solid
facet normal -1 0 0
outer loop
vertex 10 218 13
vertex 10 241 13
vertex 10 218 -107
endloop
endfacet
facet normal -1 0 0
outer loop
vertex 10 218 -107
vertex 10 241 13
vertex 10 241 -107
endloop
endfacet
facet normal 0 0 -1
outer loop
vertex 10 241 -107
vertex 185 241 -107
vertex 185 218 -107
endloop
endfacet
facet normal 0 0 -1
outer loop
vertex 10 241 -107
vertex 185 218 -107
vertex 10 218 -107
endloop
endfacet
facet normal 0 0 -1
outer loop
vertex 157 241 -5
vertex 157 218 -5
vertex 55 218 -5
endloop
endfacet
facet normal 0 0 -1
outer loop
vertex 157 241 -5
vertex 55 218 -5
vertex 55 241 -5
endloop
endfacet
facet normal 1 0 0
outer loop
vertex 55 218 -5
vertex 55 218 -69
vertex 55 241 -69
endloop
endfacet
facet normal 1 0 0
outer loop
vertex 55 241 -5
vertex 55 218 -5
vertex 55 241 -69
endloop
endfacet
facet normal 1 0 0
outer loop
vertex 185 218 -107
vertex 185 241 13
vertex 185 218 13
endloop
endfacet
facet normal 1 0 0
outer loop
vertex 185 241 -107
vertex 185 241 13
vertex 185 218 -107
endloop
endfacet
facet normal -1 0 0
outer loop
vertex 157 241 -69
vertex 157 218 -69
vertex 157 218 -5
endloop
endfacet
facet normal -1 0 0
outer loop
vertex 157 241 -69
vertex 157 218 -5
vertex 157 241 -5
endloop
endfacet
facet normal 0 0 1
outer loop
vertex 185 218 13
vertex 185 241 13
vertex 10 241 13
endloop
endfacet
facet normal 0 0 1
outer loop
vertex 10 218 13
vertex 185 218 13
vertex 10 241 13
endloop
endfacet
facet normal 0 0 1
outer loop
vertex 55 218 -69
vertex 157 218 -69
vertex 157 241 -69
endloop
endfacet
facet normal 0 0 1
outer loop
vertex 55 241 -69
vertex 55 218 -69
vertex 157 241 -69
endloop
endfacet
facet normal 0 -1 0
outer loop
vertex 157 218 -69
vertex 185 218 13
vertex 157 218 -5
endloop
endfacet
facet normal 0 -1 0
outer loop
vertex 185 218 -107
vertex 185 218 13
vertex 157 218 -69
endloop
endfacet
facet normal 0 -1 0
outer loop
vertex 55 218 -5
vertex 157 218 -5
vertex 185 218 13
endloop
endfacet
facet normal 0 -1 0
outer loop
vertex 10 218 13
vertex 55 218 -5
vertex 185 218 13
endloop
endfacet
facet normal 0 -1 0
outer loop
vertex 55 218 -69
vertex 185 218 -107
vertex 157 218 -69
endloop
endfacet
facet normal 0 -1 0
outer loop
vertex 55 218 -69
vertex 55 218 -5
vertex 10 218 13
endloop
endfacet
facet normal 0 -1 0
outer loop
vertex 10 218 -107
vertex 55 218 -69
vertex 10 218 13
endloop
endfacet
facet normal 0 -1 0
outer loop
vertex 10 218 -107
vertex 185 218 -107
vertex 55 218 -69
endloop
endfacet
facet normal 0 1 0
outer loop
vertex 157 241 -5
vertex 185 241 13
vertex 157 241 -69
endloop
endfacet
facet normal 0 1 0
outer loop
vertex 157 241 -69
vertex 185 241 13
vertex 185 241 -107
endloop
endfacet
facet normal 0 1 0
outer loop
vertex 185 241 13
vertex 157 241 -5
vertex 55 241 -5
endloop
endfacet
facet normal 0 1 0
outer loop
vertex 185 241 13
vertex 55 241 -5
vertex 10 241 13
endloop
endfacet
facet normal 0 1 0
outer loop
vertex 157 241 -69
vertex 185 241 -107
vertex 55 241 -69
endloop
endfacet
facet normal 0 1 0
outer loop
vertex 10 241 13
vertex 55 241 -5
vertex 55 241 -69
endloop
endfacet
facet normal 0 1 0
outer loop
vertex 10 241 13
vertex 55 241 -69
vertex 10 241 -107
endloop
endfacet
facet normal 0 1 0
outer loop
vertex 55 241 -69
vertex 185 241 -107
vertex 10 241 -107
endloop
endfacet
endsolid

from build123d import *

# Parameters (mm, degrees)
BOX043_W               = 30
BOX043_H               = 64
BOX043_DEPTH           = 102
BOX042_W               = 175
BOX042_H               = 120
BOX042_DEPTH           = 23
CUT013_ROLL_ANGLE      = -90
CUT013_PLACEMENT_ANGLE = -180


with BuildPart() as cube038:
    # Box043 → Box043 (new body)
    with BuildSketch(Plane(origin=(28, 18, 27), x_dir=(0, 0, -1), z_dir=(1, 0, 0))):
        with Locations((15, 32)):
            Rectangle(BOX043_W, BOX043_H)
    extrude(amount=BOX043_DEPTH)


with BuildPart() as graflok_spacer:
    # Box042 → Box042 (new body)
    with BuildSketch(Plane.XY):
        with Locations((87.5, 60)):
            Rectangle(BOX042_W, BOX042_H)
    extrude(amount=BOX042_DEPTH)

    # Cut013: cut Cube038
    add(cube038.part, mode=Mode.SUBTRACT)


with BuildPart() as graflok_spacer_1:
    # Cut013 roll: moved
    add(graflok_spacer.part.rotate(Axis((0, 0, 0), (1, 0, 0)), CUT013_ROLL_ANGLE))


with BuildPart() as graflok_spacer_2:
    # Cut013 placement: moved
    add(graflok_spacer_1.part.moved(Location((185, 241, 13))).rotate(Axis((185, 241, 13), (0, 0, 1)), CUT013_PLACEMENT_ANGLE))


solid = graflok_spacer_2.part
